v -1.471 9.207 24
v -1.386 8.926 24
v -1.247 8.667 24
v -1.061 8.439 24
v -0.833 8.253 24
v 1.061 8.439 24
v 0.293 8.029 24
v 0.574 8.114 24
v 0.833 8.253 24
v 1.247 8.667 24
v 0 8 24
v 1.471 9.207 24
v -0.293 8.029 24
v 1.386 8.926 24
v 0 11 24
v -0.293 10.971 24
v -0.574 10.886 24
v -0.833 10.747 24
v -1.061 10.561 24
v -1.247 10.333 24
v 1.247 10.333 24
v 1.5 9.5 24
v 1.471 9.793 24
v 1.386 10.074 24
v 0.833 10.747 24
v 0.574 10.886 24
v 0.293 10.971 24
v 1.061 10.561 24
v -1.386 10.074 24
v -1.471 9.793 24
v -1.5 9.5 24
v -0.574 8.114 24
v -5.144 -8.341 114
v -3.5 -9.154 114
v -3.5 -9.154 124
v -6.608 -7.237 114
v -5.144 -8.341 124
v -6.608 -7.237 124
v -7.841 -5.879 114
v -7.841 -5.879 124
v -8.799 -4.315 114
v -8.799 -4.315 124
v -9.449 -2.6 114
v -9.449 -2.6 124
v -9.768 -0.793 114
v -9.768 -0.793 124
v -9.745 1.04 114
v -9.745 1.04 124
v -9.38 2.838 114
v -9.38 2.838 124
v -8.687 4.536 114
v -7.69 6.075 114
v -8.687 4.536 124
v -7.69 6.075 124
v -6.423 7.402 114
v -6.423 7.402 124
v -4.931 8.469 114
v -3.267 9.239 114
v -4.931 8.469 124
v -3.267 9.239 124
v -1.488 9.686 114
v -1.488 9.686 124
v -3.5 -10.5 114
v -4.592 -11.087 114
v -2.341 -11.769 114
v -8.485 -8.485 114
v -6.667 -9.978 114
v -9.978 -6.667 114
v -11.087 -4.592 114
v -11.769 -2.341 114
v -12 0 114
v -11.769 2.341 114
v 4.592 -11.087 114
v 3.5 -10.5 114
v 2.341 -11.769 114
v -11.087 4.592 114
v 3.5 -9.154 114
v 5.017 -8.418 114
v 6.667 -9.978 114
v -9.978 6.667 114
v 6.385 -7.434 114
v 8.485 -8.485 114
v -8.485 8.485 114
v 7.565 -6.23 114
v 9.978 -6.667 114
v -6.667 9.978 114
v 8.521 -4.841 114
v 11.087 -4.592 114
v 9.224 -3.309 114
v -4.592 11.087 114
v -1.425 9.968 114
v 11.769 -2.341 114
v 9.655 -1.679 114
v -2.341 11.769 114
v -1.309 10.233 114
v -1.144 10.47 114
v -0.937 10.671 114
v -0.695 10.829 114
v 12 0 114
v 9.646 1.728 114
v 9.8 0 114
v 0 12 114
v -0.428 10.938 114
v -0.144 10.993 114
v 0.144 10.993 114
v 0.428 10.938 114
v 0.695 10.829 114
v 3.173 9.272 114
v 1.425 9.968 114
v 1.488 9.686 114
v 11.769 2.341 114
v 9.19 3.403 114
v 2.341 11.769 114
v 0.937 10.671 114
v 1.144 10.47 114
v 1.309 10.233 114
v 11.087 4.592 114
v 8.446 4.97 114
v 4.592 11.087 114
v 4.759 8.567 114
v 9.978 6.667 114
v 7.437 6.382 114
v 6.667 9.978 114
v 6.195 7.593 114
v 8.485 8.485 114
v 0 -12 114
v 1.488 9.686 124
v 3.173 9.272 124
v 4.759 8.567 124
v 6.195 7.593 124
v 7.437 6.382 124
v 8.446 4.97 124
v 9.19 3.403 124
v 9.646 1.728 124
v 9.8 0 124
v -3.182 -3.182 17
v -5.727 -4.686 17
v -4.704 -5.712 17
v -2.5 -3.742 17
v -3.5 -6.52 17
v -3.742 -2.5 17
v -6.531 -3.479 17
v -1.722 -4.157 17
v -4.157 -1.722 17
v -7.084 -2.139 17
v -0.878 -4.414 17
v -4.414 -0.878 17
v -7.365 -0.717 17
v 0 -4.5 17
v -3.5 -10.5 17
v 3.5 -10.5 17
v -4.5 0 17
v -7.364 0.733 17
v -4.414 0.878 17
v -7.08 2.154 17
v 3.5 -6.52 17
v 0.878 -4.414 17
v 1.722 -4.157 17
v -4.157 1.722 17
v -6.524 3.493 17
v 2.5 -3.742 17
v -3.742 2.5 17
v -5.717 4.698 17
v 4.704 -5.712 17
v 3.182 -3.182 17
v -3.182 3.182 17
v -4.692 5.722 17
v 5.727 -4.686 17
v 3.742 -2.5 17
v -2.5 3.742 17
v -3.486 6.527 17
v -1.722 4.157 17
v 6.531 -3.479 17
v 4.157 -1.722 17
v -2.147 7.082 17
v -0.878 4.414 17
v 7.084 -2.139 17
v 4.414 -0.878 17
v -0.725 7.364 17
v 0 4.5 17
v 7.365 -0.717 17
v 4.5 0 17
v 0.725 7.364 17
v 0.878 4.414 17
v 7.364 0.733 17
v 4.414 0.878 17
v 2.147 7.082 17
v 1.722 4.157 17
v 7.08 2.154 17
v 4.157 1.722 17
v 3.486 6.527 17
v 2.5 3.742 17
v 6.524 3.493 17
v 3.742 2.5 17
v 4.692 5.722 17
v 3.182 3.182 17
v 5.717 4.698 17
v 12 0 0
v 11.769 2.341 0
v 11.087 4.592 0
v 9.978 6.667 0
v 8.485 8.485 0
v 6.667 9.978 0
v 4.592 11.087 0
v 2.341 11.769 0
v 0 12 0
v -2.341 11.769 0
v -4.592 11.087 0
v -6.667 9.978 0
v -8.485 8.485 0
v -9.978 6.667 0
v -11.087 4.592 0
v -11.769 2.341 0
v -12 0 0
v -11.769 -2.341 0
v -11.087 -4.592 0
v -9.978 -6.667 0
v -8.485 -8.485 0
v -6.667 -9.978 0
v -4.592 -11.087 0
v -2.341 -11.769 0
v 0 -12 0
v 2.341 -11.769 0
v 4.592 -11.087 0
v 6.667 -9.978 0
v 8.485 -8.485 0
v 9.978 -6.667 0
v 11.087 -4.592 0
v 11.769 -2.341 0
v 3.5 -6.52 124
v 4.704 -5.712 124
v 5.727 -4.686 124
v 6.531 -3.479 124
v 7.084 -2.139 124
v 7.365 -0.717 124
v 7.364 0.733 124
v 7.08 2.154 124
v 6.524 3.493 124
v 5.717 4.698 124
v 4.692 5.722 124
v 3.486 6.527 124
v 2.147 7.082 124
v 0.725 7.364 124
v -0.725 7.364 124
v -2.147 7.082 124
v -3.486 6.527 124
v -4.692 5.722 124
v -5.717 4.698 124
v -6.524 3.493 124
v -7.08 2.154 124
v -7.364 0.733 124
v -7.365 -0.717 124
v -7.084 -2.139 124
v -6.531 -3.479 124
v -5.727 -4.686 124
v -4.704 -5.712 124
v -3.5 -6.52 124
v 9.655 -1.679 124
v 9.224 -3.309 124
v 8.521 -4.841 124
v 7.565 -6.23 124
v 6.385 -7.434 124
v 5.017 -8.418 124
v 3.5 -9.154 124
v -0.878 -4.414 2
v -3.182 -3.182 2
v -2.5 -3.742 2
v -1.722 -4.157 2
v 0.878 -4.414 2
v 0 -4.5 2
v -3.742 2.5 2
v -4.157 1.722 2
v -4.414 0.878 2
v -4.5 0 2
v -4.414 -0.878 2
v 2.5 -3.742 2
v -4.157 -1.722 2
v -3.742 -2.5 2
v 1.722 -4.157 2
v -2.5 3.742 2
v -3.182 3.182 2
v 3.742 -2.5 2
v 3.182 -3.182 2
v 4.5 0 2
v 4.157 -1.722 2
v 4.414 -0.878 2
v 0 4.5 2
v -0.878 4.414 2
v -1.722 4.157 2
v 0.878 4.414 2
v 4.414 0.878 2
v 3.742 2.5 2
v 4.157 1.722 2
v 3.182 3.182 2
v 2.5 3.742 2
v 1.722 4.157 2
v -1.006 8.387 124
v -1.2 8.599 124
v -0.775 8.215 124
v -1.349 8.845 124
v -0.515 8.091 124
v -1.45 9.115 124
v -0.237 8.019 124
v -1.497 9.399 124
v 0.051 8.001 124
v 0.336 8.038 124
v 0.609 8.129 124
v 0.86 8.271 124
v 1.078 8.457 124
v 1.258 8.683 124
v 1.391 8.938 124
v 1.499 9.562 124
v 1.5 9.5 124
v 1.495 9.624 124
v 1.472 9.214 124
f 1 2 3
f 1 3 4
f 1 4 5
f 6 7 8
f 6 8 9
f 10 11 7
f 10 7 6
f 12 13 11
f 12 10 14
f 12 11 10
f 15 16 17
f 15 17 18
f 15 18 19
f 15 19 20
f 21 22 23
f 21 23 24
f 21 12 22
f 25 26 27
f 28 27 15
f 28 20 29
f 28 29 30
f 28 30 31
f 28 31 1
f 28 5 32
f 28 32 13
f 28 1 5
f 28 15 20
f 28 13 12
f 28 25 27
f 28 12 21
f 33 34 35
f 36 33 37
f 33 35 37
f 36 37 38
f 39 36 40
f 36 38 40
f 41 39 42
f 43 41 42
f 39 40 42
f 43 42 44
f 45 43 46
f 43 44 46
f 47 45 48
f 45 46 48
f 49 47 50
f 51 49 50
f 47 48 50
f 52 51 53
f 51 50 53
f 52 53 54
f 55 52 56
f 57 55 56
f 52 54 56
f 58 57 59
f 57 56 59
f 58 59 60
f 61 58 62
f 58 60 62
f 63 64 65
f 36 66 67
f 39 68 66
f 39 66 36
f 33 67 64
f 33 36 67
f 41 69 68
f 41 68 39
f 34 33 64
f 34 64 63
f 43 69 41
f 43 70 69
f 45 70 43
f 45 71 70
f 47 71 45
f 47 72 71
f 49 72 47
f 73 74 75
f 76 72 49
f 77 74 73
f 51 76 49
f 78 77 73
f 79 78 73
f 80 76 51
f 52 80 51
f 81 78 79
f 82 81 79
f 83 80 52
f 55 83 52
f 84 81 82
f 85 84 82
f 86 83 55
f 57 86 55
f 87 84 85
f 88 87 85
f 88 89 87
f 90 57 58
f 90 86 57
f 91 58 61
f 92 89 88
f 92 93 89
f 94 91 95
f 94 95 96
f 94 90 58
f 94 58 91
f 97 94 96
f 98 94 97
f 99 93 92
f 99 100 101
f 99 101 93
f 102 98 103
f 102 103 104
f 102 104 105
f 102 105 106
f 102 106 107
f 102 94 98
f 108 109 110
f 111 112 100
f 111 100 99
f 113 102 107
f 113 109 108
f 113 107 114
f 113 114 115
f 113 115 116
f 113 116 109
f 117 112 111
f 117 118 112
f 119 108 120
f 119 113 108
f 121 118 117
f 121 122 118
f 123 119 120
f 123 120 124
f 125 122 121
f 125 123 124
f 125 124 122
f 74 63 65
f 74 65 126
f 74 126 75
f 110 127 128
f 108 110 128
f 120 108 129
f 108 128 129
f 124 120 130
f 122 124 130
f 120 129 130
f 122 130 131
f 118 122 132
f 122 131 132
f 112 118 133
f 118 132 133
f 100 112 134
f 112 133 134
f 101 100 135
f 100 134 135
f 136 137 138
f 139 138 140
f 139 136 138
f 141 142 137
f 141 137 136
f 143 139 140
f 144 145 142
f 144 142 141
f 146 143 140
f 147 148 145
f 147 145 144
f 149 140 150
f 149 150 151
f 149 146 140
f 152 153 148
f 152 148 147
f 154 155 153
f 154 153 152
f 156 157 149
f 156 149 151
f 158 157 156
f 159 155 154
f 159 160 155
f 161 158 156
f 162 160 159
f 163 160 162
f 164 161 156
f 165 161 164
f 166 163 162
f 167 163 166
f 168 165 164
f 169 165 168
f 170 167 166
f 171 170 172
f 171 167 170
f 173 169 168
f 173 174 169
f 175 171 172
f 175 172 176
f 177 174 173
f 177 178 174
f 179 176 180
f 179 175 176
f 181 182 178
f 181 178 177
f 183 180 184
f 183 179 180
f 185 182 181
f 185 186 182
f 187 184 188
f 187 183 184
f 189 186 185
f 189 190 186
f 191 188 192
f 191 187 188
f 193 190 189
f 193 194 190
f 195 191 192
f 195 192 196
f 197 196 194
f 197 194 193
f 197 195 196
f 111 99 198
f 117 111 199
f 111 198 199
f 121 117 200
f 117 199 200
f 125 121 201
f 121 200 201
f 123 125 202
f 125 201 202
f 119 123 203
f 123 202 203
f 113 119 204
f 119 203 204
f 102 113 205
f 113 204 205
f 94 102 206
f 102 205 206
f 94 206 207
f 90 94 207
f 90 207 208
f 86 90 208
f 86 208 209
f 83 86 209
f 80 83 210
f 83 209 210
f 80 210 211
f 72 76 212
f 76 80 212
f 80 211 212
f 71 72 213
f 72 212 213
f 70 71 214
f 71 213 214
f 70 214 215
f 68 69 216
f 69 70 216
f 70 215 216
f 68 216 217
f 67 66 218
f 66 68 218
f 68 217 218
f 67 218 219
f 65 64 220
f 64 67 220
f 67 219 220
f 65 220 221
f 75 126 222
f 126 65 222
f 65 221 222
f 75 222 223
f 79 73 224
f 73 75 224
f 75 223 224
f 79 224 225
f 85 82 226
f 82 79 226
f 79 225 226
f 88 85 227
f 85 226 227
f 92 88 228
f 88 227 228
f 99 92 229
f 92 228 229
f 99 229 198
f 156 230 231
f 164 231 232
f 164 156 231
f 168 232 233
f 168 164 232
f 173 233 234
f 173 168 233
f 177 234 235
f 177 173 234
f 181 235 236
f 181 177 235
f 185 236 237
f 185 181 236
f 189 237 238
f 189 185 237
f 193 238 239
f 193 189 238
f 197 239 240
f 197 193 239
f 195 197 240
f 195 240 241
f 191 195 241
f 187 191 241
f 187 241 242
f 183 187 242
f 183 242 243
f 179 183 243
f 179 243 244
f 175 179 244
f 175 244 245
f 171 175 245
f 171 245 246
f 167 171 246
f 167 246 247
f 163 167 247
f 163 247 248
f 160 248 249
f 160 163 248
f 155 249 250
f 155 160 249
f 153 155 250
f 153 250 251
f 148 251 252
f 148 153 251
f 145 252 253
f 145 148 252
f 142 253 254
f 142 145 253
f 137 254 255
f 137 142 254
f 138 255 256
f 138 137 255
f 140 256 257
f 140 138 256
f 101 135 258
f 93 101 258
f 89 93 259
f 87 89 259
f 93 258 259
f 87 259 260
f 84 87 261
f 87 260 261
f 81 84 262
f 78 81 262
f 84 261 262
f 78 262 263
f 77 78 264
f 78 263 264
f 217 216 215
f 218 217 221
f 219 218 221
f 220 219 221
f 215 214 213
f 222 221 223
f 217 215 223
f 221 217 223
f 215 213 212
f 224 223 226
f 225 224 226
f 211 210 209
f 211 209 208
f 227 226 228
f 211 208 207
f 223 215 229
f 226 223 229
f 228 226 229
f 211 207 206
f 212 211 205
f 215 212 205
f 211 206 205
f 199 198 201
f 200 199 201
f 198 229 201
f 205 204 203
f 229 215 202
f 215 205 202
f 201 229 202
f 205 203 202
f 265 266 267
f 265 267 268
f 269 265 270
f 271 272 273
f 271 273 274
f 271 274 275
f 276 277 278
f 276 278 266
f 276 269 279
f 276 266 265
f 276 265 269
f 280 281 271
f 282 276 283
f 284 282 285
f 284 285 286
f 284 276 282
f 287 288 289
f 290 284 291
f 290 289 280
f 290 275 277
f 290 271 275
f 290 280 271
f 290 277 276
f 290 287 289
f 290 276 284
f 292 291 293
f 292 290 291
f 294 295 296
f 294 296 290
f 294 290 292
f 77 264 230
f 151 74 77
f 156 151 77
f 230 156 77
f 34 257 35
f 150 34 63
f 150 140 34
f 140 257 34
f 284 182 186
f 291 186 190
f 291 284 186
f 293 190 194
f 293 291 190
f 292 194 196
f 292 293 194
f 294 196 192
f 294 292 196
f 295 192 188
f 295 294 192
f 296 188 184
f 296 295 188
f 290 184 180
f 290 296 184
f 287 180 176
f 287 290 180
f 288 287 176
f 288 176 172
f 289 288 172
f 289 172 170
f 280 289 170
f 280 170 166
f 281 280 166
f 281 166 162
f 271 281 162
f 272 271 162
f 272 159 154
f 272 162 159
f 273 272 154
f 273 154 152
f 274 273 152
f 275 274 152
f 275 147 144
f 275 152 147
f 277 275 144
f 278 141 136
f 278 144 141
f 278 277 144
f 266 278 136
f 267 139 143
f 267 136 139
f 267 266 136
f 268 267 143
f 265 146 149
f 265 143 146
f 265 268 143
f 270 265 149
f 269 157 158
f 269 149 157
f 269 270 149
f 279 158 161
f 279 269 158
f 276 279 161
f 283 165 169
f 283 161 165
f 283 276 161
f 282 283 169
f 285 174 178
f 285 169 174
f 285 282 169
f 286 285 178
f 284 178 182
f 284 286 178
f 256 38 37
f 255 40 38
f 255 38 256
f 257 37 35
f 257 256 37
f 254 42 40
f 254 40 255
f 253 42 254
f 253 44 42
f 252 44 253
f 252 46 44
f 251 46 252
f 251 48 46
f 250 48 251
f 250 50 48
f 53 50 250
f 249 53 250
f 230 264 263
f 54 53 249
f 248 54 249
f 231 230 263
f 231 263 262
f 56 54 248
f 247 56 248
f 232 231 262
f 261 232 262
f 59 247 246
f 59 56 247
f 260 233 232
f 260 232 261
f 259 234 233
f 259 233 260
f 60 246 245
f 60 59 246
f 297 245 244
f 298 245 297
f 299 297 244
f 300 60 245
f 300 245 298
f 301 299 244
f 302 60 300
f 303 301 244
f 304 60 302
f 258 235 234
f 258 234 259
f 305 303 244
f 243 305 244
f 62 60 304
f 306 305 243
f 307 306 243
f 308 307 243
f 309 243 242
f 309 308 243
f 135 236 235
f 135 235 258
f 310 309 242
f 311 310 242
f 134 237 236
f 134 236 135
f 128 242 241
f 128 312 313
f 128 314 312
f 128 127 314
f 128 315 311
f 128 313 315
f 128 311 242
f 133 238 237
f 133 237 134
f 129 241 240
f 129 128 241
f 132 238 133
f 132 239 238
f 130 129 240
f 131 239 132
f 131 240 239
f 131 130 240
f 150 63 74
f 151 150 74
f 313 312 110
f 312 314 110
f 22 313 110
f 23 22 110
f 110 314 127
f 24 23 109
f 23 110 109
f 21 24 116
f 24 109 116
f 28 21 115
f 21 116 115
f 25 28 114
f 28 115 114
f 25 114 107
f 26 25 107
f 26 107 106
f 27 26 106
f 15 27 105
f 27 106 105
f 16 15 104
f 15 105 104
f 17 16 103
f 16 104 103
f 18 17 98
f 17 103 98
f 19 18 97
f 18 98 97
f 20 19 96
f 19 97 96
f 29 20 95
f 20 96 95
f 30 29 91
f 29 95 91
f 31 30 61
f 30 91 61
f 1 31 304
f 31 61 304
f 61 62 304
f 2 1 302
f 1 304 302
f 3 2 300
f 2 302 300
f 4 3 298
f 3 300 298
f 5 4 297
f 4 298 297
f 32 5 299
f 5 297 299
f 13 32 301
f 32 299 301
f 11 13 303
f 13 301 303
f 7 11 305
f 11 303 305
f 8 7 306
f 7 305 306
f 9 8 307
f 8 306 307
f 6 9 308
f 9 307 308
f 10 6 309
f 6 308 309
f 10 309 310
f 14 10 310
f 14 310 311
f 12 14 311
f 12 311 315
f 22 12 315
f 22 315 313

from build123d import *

# Parameters (mm, degrees)
F0_R      = 12
F1_DEPTH  = 2
F2_R      = 12
F2_R_2    = 4.5
F3_DEPTH  = 15
F4_R      = 12
F4_R_2    = 7.4
F5_DEPTH  = 107
F7_DEPTH  = 107.001
F8_R      = 1.5
F9_DEPTH  = 100
F10_R     = 12
F11_DEPTH = 10
F13_DEPTH = 10


with BuildPart() as f1:
    # F0 (on Top) → F1 (new body)
    with BuildSketch(Plane.XY):
        Circle(F0_R)
    extrude(amount=F1_DEPTH)

    # F2 (on face) → F3 (join)
    with BuildSketch(Plane.XY.offset(2)):
        Circle(F2_R)
        Circle(F2_R_2, mode=Mode.SUBTRACT)
    extrude(amount=F3_DEPTH)

    # F4 (on face) → F5 (join)
    with BuildSketch(Plane.XY.offset(17)):
        Circle(F4_R)
        Circle(F4_R_2, mode=Mode.SUBTRACT)
    extrude(amount=F5_DEPTH)

    # F6 (on face) → F7 (cut, through all)
    with BuildSketch(Plane.XY.offset(17)):
        Polygon((3.5, 0), (0, 0), (-3.5, 0), (-3.5, -10.5), (3.5, -10.5), align=None)
    extrude(amount=F7_DEPTH, mode=Mode.SUBTRACT)

    # F8 (on face) → F9 (cut)
    with BuildSketch(Plane.XY.offset(124)):
        with Locations((0, 9.5)):
            Circle(F8_R)
    extrude(amount=-F9_DEPTH, mode=Mode.SUBTRACT)

    # F10 (on face) → F11 (cut)
    with BuildSketch(Plane.XY.offset(124)):
        Circle(F10_R)
        with BuildLine():
            ThreePointArc((1.488384, 9.686316), (7.437276, 6.381765), (9.8, 0))
            ThreePointArc((9.8, 0), (8.072794, -5.556078), (3.5, -9.153688))
            Line((3.5, -9.153688), (3.5, -10.5))
            Line((3.5, -10.5), (-3.5, -10.5))
            Line((-3.5, -10.5), (-3.5, -9.153688))
            ThreePointArc((-3.5, -9.153688), (-9.74461, 1.040468), (-1.488384, 9.686316))
            ThreePointArc((-1.488384, 9.686316), (0, 11), (1.488384, 9.686316))
        make_face(mode=Mode.SUBTRACT)
    extrude(amount=-F11_DEPTH, mode=Mode.SUBTRACT)

    # F12 (on face) → F13 (cut)
    with BuildSketch(Plane.XY.offset(124)):
        Polygon((3.5, 0), (0, 0), (-3.5, 0), (-3.5, -12), (3.5, -12), align=None)
    extrude(amount=-F13_DEPTH, mode=Mode.SUBTRACT)


solid = f1.part
